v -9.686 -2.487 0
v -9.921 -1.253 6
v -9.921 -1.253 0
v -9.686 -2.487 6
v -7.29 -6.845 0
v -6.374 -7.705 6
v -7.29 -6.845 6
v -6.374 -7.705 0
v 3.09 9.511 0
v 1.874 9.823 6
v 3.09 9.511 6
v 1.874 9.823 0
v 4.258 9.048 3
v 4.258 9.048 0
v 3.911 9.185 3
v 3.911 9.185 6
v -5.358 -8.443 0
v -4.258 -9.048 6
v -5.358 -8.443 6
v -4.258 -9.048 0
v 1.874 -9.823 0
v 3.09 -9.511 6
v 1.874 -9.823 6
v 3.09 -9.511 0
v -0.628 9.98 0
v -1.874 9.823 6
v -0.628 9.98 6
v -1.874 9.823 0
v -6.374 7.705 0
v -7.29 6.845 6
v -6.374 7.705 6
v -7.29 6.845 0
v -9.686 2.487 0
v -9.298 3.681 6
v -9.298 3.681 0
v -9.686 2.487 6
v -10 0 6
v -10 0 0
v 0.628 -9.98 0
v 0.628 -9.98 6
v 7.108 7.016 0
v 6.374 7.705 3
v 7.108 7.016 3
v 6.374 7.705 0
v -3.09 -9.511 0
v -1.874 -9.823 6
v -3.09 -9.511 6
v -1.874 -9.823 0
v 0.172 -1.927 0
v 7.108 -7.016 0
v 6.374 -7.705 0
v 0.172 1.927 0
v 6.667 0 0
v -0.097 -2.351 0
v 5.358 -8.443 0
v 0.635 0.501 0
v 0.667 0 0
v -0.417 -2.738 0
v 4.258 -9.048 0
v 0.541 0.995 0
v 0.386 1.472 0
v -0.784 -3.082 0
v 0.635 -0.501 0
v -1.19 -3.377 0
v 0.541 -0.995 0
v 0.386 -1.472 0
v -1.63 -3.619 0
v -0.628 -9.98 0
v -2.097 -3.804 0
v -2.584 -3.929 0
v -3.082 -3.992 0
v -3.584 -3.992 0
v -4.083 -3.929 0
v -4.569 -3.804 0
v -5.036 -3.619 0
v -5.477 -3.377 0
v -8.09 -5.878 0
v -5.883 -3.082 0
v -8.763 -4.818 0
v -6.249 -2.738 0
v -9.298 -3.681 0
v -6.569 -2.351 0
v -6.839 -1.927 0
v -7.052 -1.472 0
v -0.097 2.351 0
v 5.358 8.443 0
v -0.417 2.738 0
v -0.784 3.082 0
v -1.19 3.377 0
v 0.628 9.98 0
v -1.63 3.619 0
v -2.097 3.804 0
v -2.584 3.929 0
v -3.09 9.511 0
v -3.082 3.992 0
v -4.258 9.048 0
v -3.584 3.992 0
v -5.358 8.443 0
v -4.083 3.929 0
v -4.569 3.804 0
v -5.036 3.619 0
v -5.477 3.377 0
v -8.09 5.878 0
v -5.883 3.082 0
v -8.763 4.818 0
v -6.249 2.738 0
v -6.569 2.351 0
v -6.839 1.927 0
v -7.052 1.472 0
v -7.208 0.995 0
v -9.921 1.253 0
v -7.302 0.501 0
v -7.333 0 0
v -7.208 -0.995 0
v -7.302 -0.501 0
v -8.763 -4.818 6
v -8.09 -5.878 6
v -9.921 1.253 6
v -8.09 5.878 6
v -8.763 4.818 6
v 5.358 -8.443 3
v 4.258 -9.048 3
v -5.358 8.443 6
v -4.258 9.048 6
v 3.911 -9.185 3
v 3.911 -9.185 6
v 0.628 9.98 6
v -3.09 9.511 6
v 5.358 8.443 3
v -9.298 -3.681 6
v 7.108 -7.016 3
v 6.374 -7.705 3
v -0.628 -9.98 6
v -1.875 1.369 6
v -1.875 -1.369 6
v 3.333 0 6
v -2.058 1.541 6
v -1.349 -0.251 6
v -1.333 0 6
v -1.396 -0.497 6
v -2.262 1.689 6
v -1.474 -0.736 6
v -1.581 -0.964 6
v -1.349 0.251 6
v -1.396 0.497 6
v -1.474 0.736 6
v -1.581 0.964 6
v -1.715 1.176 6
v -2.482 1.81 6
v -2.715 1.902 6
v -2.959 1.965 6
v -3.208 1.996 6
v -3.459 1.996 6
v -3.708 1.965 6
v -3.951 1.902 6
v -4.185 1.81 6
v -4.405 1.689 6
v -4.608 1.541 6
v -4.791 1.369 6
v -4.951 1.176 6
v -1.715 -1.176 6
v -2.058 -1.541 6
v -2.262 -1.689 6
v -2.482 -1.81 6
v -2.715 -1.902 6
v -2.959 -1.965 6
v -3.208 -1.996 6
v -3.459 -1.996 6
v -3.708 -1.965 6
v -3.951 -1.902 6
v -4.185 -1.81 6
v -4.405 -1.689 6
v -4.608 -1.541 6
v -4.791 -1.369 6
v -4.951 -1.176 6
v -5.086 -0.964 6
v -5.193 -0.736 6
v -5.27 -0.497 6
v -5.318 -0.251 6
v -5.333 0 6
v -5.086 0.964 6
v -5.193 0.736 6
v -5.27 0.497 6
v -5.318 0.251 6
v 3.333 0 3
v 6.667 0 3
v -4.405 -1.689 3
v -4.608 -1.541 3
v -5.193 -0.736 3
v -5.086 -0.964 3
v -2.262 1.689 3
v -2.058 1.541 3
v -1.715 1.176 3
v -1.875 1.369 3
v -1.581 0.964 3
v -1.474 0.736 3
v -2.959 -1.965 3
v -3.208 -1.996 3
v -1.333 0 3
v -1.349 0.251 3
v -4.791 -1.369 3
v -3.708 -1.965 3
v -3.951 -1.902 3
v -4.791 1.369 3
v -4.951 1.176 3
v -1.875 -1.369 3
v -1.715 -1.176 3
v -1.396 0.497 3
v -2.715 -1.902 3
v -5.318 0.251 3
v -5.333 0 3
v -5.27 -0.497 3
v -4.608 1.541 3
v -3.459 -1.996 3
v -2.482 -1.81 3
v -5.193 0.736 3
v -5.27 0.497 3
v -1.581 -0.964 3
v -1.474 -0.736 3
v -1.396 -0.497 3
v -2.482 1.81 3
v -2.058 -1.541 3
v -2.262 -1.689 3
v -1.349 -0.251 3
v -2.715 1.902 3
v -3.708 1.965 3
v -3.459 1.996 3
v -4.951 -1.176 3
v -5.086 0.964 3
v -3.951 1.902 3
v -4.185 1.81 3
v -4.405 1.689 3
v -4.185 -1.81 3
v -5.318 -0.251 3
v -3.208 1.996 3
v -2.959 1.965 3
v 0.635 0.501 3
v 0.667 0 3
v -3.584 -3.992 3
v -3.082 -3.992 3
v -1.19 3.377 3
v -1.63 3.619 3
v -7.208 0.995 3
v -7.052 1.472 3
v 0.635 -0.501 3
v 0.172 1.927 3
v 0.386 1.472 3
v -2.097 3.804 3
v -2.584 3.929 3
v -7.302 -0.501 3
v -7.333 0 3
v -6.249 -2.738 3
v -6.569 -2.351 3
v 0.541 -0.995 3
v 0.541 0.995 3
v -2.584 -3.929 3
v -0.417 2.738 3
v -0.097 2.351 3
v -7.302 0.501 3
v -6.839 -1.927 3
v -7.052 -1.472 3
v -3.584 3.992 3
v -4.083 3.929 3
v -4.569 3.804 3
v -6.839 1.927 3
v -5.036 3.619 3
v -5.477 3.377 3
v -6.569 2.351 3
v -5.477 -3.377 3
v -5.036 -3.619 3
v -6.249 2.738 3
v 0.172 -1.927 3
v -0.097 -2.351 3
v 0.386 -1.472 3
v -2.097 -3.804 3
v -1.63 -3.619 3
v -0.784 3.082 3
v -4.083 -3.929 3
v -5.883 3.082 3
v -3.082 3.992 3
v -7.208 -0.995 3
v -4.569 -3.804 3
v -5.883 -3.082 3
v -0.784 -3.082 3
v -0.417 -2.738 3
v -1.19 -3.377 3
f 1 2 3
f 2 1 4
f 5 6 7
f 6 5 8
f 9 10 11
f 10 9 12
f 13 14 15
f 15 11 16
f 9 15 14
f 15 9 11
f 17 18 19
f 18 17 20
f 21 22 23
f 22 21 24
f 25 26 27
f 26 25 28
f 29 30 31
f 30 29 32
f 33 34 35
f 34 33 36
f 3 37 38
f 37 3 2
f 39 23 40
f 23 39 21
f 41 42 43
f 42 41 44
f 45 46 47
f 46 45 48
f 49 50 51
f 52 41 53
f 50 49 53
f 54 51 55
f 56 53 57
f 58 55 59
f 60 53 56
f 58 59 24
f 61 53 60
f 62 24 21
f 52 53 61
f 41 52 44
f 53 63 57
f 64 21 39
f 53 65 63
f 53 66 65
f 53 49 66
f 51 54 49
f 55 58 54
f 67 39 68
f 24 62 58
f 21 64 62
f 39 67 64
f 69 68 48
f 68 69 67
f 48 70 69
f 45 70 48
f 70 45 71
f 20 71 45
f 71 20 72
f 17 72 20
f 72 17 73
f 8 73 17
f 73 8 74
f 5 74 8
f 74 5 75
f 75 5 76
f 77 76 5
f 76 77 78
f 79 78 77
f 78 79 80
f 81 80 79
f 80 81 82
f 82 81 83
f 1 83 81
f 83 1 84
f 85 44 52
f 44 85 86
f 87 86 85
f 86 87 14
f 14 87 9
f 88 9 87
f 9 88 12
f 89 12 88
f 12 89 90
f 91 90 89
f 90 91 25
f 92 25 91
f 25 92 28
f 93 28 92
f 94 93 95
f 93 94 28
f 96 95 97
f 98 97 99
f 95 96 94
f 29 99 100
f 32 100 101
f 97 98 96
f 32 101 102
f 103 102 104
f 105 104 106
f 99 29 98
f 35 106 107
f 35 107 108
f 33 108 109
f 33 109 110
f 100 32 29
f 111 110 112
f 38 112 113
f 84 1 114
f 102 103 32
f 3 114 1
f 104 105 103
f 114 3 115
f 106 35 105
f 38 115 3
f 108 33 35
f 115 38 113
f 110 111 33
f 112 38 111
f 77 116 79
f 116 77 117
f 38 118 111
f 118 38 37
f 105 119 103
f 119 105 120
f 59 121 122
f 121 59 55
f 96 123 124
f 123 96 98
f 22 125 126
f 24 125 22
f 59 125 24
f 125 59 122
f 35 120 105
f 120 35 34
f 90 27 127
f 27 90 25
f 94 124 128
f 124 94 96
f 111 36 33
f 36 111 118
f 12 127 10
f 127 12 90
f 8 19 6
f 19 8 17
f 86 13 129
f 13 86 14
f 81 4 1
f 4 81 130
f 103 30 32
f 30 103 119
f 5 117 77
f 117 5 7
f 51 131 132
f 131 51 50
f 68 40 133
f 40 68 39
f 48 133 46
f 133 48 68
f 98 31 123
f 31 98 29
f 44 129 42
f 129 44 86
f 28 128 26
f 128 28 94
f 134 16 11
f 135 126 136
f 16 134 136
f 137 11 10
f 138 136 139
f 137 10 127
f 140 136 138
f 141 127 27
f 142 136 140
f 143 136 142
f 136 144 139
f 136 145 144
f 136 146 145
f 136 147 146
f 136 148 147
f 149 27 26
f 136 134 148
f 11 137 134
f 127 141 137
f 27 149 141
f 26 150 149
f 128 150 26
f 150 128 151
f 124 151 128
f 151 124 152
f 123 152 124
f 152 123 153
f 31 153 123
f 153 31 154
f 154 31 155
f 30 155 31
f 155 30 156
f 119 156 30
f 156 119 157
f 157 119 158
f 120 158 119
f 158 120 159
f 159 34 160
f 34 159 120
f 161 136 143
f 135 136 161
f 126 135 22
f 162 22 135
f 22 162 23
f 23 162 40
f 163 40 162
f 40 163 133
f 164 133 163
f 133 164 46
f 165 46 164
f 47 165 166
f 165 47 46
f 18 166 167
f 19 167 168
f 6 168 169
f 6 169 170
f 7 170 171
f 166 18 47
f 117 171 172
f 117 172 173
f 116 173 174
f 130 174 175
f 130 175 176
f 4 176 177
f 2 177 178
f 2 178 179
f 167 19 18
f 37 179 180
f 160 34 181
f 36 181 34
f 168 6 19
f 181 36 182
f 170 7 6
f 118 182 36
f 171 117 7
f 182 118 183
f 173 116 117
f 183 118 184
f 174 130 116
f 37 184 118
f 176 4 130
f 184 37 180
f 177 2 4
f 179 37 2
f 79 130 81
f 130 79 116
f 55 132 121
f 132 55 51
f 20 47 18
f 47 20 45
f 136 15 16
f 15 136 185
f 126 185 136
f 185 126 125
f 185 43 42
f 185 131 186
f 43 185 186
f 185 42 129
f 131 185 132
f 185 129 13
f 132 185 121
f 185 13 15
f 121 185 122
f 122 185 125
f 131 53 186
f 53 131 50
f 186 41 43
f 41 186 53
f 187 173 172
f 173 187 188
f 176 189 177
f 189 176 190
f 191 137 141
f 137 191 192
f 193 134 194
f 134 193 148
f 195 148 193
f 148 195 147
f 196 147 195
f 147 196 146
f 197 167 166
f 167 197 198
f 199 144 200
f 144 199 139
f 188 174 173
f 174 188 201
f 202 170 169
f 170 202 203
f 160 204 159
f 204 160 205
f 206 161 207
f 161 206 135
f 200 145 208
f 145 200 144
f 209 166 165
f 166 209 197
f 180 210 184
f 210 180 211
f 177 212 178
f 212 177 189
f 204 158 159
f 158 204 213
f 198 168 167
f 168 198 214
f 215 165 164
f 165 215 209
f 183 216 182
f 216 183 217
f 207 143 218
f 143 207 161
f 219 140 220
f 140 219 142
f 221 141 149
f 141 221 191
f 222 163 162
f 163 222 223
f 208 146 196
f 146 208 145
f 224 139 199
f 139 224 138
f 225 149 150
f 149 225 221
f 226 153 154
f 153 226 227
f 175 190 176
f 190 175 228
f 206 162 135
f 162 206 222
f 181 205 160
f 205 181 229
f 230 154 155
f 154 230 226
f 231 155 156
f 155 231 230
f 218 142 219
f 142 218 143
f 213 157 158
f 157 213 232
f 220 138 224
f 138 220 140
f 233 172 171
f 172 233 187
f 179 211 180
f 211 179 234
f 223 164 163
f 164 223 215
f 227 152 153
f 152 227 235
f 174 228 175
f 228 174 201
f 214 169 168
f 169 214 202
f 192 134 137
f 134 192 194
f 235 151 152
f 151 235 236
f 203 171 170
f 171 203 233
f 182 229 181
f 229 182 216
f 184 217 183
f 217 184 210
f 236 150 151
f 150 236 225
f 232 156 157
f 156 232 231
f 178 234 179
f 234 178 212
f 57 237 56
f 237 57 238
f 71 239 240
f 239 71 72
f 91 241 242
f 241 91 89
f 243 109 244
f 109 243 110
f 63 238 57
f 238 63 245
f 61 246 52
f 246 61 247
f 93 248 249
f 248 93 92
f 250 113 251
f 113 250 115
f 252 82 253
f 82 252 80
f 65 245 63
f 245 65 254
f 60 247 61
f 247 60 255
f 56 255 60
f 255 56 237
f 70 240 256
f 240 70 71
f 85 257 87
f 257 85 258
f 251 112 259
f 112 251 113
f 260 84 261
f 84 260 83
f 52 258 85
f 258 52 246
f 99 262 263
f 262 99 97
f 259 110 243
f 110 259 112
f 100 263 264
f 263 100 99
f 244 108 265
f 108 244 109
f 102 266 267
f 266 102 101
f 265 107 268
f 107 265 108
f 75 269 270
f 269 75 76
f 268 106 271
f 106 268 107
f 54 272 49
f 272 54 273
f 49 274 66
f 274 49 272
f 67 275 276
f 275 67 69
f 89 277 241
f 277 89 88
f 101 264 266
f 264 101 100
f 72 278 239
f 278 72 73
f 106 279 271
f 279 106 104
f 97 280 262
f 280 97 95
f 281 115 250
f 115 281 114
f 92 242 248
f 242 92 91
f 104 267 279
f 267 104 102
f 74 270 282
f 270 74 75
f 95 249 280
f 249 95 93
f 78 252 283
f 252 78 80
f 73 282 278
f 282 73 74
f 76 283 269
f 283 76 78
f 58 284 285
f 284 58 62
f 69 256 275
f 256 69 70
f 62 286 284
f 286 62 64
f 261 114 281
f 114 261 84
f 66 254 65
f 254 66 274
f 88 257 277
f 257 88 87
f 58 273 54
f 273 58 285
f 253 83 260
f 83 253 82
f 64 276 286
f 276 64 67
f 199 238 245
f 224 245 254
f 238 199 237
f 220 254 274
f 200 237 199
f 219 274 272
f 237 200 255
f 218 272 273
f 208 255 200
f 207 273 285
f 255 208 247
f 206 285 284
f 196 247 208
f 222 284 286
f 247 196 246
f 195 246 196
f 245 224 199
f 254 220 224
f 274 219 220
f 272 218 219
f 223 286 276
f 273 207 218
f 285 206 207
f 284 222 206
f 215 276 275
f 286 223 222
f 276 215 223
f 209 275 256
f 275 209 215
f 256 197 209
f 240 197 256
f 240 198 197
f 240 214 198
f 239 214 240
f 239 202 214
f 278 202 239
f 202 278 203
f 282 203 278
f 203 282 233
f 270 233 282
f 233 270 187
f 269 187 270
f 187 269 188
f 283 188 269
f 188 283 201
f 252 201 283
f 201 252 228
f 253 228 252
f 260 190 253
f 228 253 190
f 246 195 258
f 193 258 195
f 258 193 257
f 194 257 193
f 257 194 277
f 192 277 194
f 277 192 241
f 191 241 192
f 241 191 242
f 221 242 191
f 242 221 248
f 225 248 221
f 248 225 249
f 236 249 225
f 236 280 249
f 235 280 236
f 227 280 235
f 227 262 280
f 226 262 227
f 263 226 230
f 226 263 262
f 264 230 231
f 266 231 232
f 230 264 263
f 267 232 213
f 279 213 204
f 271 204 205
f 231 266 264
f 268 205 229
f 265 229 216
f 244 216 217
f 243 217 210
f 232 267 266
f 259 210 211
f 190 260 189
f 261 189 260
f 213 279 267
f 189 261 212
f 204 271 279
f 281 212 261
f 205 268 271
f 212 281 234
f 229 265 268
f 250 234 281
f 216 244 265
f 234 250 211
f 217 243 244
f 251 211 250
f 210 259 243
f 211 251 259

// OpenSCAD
/* [Support] */
diam_ext_support=20; // [10:1:30]
epaisseur_sur_vitre=3; // [0:0.1:10]
encoche_percent=0.5; // [0.3:0.1:0.7]
epaisseur_sous_vitre=0; // [0:0.1:10]

/* [Screw] */
vis_diam=4; // [2:0.1:5]
vis_tete_diam=8; // [4:0.1:10]

/* [Glass] */
vitre_diam=200; // [150:1:250]
vitre_haut=3; // [2:0.1:5]

/* [Hidden] */
artefact=0.05;
globalView=0; //[0,1] Put 1 if you want to see a global view

module support_vitre() {
    position_encoche=diam_ext_support/6;
    difference() {
        union(){
        cylinder(h=epaisseur_sur_vitre+vitre_haut+epaisseur_sous_vitre,d=diam_ext_support,$fn=50); //Piece brute
        translate([0,0,epaisseur_sur_vitre+vitre_haut])
            cylinder(h=epaisseur_sous_vitre,d=diam_ext_support,$fn=50); //Piece dessous
        }
        translate([vitre_diam/2+position_encoche,0,epaisseur_sur_vitre])
            cylinder(h=vitre_haut+artefact,d=vitre_diam,$fn=50); //Trou Vitre

        translate([vitre_diam/2+position_encoche/encoche_percent,0,-artefact])
            cylinder(h=vitre_haut+epaisseur_sur_vitre+2*artefact,d=vitre_diam,$fn=50); //Encoche dessus vitre

        translate([-position_encoche,0,-artefact])
            cylinder(h=epaisseur_sur_vitre+vitre_haut+epaisseur_sous_vitre+2*artefact,d=vis_diam,$fn=50); //Trou vis
        
        translate([-position_encoche,0,-artefact])
            cylinder(h=epaisseur_sur_vitre+artefact,d=vis_tete_diam,$fn=50); //Trou tete vis
        }
}

module glass() {
    translate([0,0,-artefact])
        cylinder(h=vitre_haut+artefact,d=vitre_diam,$fn=50); //Vitre
}

if (globalView) %translate([0,0,10]) rotate([90,0,0]) text("Down view");
if (globalView) %color("LightCyan") translate([0,0,epaisseur_sur_vitre-artefact]) glass();

if (globalView) color("gold") translate([-vitre_diam/2-diam_ext_support/6,0,0]) support_vitre();
else support_vitre();

if (globalView)
    for(angle=[60:60:300])
        %color("gold") rotate([0,0,angle]) translate([-vitre_diam/2-diam_ext_support/6,0,0]) support_vitre();

if (globalView) %translate([0,0,-10]) rotate([-90,0,0]) text("Top view");
